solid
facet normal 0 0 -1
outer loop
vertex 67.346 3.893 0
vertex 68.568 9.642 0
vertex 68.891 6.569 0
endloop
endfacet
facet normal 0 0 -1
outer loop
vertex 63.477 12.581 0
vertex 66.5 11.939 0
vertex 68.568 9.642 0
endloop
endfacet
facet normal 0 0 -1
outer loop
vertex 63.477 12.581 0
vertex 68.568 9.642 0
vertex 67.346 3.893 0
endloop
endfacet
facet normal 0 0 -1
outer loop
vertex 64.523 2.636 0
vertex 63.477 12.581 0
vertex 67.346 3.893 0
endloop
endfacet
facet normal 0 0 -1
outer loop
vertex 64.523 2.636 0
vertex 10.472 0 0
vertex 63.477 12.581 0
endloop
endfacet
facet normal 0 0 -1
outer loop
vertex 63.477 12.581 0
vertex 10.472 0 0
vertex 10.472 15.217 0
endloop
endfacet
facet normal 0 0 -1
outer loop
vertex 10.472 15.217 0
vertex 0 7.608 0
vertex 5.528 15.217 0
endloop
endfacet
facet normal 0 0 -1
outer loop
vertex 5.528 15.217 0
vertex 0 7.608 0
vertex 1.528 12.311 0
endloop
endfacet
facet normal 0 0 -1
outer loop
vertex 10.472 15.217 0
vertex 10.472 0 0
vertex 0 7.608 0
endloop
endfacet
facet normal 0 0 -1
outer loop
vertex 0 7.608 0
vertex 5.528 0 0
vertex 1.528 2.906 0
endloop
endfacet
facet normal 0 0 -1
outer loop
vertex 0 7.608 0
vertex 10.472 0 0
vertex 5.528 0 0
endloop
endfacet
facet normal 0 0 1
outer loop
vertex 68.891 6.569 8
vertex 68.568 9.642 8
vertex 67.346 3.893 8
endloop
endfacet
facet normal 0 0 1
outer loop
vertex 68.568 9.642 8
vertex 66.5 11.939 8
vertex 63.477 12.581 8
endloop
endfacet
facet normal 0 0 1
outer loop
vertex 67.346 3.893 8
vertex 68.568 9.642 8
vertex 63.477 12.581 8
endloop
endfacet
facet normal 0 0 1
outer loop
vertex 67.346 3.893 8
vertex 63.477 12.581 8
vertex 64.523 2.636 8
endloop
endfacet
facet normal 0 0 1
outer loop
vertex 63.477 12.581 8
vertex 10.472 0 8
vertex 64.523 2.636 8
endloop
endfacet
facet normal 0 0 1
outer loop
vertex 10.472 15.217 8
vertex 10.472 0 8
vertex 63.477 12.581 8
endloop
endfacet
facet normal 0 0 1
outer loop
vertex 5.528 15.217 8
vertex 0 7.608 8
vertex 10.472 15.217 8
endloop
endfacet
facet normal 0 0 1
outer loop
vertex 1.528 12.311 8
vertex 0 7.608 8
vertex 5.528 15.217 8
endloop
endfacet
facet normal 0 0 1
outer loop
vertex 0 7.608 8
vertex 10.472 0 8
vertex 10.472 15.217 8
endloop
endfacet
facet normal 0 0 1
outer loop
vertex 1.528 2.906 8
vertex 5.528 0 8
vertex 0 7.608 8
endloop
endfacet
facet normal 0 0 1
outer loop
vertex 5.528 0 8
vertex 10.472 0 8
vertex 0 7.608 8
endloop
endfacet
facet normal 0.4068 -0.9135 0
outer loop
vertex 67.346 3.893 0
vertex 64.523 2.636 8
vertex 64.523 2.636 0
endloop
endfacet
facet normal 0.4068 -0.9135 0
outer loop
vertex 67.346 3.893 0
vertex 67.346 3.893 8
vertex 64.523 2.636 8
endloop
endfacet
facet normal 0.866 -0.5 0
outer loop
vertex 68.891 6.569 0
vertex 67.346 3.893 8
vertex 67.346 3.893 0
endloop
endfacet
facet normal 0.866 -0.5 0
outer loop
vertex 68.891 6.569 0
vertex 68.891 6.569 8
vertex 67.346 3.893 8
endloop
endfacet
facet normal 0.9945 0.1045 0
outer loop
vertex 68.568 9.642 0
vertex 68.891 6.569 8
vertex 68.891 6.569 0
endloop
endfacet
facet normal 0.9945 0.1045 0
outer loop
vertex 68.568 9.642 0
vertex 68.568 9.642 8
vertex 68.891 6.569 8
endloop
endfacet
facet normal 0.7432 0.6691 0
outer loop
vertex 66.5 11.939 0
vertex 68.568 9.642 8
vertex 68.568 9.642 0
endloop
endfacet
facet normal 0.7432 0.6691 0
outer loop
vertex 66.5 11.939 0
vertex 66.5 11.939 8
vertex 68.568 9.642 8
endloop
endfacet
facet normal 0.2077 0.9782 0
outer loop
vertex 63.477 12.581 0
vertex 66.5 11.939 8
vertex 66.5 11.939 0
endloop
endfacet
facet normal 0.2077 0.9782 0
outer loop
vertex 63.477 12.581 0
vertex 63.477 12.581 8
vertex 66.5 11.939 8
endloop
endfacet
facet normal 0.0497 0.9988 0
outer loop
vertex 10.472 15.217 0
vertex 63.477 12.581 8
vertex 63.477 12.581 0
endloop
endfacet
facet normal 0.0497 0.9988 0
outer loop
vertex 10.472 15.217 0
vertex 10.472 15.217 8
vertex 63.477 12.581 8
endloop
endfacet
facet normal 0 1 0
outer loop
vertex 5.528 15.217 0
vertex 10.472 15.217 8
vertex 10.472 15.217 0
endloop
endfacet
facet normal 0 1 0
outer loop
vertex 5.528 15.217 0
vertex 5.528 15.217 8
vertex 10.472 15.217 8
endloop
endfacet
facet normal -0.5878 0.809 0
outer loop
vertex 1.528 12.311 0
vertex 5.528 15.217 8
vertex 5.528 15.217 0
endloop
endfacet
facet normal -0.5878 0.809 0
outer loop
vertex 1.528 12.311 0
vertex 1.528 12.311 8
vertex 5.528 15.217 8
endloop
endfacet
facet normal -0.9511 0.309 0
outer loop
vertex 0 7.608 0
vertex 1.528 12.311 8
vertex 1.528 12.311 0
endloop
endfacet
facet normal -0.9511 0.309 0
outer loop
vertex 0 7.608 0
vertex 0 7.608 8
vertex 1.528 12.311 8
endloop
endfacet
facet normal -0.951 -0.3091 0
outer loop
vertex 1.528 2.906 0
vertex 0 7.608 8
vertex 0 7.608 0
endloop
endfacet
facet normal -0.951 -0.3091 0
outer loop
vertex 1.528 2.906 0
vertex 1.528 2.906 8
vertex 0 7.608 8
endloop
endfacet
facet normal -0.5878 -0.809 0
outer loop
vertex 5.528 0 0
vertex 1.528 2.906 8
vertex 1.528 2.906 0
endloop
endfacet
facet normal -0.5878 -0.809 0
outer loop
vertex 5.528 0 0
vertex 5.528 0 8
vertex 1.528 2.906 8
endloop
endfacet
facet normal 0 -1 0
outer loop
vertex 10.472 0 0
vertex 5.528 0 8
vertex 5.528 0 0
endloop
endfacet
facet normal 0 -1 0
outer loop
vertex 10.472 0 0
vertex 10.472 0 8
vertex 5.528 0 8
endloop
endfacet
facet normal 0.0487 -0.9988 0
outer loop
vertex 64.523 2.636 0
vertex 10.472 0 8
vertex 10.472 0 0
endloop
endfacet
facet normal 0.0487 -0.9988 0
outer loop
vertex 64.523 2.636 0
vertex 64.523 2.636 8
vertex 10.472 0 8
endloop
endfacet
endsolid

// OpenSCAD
$fn = 32;

// ----------------------------------------------------------------------
// Lever arm: two bosses 16 and 10 mm, 35 mm between centres
// ----------------------------------------------------------------------

// --- parameters (mm) ---
profile_height = 8;       // extrusion height
profile_points = 13;      // points of the closed outline

profile = [[0, 7.608], [1.528, 2.906], [5.528, 0], [10.472, 0], [64.523, 2.636], [67.346, 3.893], [68.891, 6.569], [68.568, 9.642], [66.5, 11.939], [63.477, 12.581], [10.472, 15.217], [5.528, 15.217], [1.528, 12.311]];  // single closed polygon, 13 points, counter clockwise

// --- the one profile operation ---
linear_extrude(height = profile_height) polygon(points = profile);
